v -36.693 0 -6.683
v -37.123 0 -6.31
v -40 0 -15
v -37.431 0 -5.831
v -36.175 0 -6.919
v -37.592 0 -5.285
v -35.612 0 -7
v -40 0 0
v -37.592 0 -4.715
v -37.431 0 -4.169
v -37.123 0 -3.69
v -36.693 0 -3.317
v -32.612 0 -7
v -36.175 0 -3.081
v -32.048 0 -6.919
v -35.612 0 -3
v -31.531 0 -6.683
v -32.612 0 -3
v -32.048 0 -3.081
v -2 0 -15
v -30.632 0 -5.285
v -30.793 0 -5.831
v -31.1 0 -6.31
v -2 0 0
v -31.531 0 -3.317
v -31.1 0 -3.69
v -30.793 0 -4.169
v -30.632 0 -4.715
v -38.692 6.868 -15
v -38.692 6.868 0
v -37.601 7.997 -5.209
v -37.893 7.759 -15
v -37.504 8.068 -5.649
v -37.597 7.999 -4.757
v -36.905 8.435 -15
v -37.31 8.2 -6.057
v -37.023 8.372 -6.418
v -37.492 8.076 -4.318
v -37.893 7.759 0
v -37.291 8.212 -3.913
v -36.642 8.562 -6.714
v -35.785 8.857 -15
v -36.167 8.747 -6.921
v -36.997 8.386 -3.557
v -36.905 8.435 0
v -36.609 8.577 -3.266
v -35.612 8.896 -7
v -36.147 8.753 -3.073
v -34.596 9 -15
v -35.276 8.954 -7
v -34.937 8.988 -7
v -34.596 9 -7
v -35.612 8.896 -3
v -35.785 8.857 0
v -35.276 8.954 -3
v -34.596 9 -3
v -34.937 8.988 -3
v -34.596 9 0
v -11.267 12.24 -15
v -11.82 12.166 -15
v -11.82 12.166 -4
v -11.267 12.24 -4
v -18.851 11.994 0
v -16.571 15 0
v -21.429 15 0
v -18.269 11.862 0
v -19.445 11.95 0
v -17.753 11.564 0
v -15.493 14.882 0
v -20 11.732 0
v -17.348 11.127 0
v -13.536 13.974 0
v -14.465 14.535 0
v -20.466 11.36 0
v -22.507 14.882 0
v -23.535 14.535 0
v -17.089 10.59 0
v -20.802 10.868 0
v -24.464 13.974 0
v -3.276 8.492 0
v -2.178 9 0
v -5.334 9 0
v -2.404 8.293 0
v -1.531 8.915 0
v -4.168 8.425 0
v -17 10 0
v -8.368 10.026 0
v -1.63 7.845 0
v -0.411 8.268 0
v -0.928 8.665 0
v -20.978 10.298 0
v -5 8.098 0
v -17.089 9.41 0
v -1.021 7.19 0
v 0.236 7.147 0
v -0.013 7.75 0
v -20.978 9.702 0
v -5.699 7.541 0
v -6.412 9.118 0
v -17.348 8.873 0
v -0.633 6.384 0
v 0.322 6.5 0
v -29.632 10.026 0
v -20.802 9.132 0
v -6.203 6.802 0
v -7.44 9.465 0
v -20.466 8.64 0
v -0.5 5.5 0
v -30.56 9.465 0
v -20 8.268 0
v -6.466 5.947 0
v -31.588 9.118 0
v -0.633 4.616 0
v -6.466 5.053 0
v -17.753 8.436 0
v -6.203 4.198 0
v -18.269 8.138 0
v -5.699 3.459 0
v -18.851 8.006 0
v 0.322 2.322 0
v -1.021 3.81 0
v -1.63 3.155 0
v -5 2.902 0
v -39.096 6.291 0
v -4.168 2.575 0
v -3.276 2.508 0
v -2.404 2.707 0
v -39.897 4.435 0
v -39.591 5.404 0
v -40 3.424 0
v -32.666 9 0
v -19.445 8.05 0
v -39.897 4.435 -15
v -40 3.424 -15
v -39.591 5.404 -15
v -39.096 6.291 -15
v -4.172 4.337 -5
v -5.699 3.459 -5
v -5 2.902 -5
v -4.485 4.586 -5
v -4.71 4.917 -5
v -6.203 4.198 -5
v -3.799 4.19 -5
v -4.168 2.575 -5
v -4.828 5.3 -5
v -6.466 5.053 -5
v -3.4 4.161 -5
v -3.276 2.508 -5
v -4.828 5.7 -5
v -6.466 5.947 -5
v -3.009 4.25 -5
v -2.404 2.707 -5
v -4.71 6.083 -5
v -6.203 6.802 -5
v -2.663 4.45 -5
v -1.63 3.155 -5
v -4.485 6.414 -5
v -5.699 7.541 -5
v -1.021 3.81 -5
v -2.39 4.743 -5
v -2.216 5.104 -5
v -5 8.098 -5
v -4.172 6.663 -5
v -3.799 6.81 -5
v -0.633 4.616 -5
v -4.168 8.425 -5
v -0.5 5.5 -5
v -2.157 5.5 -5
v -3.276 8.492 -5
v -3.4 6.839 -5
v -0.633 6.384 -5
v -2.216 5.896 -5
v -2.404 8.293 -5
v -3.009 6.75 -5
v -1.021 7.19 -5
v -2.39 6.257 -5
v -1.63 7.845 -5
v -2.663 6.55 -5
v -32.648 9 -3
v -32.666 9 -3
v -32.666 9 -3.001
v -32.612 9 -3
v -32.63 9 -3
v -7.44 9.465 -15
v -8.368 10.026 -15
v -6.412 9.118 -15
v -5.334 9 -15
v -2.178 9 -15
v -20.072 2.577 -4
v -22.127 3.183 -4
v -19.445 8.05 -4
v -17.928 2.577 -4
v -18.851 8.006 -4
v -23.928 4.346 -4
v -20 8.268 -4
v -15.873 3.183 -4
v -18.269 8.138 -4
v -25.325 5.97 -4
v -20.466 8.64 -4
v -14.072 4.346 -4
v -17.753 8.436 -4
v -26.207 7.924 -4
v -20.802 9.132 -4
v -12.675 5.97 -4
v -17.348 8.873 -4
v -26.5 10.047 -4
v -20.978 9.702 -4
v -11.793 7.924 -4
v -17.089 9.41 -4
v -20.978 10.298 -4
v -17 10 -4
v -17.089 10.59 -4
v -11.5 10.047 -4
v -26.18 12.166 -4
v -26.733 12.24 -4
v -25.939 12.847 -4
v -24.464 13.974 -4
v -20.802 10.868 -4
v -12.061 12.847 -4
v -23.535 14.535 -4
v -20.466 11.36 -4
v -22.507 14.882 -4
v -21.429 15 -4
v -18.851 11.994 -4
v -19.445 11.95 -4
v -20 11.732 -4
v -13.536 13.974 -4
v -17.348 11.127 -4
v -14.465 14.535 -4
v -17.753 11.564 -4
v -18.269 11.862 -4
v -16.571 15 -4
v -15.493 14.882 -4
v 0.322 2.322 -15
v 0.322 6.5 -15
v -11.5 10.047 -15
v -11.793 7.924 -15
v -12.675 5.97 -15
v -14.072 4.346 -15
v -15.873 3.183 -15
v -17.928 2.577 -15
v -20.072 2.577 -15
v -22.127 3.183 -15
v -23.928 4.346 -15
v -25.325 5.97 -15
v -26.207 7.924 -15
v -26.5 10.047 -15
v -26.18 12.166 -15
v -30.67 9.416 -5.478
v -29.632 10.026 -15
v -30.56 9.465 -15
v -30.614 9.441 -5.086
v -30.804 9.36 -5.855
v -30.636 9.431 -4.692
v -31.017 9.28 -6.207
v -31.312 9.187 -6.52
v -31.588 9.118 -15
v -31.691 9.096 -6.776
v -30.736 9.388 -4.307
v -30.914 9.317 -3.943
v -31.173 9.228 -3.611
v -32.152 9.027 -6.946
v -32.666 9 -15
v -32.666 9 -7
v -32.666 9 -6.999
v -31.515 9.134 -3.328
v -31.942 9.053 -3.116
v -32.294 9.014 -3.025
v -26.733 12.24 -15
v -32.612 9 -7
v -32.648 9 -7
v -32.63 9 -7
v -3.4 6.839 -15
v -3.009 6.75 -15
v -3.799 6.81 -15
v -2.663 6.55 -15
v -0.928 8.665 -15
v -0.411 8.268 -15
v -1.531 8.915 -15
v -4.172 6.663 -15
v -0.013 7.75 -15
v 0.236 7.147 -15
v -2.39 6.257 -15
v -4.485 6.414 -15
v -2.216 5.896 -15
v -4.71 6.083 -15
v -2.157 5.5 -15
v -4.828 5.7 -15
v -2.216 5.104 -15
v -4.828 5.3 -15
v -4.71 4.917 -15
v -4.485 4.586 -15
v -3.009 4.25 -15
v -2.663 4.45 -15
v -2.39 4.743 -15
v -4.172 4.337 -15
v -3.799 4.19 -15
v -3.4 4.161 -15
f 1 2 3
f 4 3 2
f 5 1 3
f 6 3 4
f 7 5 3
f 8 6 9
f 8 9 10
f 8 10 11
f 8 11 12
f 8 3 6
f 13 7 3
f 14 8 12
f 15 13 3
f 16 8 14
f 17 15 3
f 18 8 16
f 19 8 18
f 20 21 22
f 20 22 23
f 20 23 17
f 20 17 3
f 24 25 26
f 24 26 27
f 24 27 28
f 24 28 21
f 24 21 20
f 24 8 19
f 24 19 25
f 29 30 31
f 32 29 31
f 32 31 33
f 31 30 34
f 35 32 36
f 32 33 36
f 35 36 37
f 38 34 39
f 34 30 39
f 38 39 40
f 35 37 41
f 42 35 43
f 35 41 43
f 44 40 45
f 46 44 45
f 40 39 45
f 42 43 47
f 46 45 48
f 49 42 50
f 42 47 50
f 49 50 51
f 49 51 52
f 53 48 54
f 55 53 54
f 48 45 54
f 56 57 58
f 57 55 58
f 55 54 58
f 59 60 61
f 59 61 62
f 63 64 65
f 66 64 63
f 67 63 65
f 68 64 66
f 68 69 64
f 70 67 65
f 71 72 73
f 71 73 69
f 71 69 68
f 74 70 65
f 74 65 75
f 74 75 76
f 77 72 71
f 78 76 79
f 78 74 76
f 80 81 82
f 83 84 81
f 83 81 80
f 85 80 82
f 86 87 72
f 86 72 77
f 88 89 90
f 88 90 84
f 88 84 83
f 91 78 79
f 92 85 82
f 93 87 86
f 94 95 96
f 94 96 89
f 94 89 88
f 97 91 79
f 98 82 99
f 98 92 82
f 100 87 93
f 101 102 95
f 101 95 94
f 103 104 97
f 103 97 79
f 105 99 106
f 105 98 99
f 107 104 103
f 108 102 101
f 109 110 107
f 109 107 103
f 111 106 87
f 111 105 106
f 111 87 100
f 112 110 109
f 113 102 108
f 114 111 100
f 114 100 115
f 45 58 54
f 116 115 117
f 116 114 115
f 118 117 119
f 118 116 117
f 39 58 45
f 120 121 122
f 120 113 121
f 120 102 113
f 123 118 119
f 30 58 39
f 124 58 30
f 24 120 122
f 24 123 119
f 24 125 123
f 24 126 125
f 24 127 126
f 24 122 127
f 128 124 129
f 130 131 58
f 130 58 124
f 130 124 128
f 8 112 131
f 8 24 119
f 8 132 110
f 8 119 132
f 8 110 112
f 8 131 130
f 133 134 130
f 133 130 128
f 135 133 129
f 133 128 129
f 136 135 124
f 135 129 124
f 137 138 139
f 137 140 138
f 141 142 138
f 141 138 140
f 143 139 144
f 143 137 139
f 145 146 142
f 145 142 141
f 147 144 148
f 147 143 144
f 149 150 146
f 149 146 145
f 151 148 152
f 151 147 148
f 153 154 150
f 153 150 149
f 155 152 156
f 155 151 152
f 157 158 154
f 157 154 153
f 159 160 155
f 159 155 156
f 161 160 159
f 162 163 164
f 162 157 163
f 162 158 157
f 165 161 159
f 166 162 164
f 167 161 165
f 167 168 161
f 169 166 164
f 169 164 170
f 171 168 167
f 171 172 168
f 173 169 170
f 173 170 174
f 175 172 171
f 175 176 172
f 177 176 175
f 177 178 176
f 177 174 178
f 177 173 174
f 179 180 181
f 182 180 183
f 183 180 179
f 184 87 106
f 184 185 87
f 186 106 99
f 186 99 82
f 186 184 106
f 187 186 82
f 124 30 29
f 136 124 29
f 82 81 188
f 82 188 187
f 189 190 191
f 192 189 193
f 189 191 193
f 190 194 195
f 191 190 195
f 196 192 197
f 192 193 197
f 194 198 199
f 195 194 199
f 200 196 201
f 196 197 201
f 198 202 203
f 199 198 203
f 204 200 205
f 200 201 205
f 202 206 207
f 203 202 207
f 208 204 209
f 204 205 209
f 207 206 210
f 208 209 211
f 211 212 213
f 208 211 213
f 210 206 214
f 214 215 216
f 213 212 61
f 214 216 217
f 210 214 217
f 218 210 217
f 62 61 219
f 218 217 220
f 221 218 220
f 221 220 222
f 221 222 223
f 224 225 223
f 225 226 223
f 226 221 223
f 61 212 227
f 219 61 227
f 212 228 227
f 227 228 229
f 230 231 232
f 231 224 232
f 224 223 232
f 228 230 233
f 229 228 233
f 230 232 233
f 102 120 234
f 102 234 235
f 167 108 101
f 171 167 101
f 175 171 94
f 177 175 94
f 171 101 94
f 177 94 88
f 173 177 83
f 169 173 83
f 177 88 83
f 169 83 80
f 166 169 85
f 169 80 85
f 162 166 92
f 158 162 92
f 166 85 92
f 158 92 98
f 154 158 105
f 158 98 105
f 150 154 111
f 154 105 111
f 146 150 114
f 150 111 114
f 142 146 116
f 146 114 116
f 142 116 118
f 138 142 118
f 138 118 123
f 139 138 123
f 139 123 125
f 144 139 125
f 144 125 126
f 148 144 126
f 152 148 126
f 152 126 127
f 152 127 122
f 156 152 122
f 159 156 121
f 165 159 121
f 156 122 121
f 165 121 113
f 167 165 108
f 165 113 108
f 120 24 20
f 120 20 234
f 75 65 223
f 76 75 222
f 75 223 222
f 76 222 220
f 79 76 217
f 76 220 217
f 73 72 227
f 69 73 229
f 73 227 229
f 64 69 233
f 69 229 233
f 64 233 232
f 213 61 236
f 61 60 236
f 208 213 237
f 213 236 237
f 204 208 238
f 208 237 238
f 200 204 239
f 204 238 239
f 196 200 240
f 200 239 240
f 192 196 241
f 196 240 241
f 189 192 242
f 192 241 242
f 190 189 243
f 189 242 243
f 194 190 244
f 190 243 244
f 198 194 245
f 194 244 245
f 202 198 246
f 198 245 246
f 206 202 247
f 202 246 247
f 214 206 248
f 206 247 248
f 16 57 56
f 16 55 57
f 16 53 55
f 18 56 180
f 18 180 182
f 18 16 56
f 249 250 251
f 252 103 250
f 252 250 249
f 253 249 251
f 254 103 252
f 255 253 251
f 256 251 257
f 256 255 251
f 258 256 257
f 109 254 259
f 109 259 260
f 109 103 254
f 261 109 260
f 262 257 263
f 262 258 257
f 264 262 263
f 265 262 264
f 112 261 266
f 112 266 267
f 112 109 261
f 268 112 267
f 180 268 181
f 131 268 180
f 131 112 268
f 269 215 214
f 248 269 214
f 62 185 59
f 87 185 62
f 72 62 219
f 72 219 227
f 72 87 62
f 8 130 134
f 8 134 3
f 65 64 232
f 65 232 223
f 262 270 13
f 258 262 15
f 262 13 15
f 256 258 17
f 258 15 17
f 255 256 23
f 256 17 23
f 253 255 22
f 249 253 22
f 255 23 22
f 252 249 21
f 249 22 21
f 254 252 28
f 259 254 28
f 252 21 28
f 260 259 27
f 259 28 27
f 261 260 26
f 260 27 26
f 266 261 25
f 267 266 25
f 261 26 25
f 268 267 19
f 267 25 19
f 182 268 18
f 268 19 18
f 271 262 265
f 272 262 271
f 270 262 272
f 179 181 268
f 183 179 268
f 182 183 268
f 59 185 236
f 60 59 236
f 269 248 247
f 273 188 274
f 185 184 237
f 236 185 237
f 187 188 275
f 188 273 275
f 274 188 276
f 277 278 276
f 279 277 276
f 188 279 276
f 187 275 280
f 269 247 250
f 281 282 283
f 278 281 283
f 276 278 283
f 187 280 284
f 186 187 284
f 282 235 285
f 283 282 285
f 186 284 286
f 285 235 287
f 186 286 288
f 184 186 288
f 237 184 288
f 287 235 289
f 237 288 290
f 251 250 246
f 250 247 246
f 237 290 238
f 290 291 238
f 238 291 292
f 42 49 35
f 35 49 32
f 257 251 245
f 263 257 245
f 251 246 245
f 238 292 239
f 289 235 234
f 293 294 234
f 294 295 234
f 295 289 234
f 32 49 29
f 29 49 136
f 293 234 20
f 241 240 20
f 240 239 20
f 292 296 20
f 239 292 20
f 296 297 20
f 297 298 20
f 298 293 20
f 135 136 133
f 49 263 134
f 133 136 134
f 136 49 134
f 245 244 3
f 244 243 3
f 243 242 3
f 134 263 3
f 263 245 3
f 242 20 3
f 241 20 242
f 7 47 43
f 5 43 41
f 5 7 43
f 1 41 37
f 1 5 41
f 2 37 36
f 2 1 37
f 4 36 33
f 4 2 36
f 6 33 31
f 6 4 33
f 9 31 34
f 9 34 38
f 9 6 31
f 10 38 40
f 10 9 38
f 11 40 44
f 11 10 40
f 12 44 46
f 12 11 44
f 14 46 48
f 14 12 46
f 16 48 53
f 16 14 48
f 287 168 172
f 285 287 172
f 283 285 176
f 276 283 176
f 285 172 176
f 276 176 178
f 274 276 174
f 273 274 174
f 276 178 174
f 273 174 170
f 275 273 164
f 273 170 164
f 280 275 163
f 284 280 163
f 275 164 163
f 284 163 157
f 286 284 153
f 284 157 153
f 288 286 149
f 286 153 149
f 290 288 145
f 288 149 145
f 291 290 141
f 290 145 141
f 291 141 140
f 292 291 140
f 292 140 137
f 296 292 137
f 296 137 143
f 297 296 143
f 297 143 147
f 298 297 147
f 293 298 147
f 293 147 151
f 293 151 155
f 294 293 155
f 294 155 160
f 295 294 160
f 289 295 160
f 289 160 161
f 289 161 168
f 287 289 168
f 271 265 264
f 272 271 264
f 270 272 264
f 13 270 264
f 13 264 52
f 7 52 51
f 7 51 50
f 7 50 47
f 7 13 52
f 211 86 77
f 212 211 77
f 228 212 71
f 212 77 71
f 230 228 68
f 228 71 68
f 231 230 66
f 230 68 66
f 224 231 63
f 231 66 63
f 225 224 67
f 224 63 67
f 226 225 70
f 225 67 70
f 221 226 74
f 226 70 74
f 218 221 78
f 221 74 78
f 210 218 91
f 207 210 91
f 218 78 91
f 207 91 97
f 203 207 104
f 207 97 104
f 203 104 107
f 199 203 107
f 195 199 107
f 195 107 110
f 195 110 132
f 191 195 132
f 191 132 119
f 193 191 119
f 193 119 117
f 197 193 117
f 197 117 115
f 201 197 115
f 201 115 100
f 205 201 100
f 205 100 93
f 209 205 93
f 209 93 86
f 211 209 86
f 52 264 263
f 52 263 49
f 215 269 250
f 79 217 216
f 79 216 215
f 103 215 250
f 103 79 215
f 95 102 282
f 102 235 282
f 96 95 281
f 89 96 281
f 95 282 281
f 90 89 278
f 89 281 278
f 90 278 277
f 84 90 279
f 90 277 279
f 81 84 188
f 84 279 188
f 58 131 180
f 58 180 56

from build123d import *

# Parameters (mm, degrees)
SCHIZZO2_R                   = 2
SCHIZZO2_R_2                 = 1.343240654
ESTRUSIONE_ESTRUSIONE1_DEPTH = 15
SCHIZZO3_R                   = 7.5
TAGLIO_ESTRUSIONE1_DEPTH     = 11
SMUSSO3_SIZE                 = 1
RACCORDO1_R                  = 2.5
SMUSSO4_SIZE                 = 4
SMUSSO4_SIZE2                = 2.800830153
TAGLIO_ESTRUSIONE3_DEPTH     = 46.276925691
FILLET1_R                    = 5
FILLET3_R                    = 5
FILLET4_R                    = 5
FILLET5_R                    = 5
SKETCH1_R                    = 3
CUT_EXTRUDE1_DEPTH           = 5


with BuildPart() as part:
    # Schizzo2 → Estrusione-Estrusione1 (new body)
    with BuildSketch(Plane.XY):
        Polygon((-40, 0), (-2, 0), (0.321661039, 2.321661039), (0.321661039, 9), (-7.024563842, 9), (-14.880083854, 15), (-23.119916146, 15), (-30.975436158, 9), (-40, 9), align=None)
        with Locations((-19, 10)):
            Circle(SCHIZZO2_R, mode=Mode.SUBTRACT)
        with Locations((-3.5, 5.5)):
            Circle(SCHIZZO2_R_2, mode=Mode.SUBTRACT)
    extrude(amount=-ESTRUSIONE_ESTRUSIONE1_DEPTH)

    # Schizzo3 → Taglio-Estrusione1 (cut)
    with BuildSketch(Plane(origin=(0, 0, -15), x_dir=(-1, 0, 0), z_dir=(0, 0, -1))):
        with Locations((19, 10)):
            Circle(SCHIZZO3_R)
    extrude(amount=-TAGLIO_ESTRUSIONE1_DEPTH, mode=Mode.SUBTRACT)

    # Smusso3
    # the kernel refuses this chamfer: 1, 0.730975935 mm, written as the material it takes off along each edge
    with BuildSketch(Plane(origin=(-25.938580935, 12.847120406, -4), x_dir=(-0.7947073367402627, -0.6069927914985472, 0), z_dir=(0, 0, -1))) as smusso3_piece_1:
        with BuildLine():
            Line((SMUSSO3_SIZE, 0), (0.605555486, -0.394444514))
            ThreePointArc((0.605555486, -0.394444514), (0.30405624, -0.187661825), (0, 0))
            Line((0, 0), (SMUSSO3_SIZE, 0))
        make_face()
    extrude(amount=13.571682988, mode=Mode.SUBTRACT)
    with BuildSketch(Plane(origin=(-12.061419065, 12.847120406, -4), x_dir=(0.33460224521765425, -0.94235945238285, 0), z_dir=(0, 0, -1))) as smusso3_piece_2:
        with BuildLine():
            Line((0.722692134, 0), (SMUSSO3_SIZE * 0.837916253761, -SMUSSO3_SIZE * 0.545798819789))
            Line((SMUSSO3_SIZE * 0.837916253761, -SMUSSO3_SIZE * 0.545798819789), (0, 0))
            ThreePointArc((0, 0), (0.357199268, -0.008708643), (0.722692134, 0))
        make_face()
    extrude(amount=13.571682988, mode=Mode.SUBTRACT)

    # Raccordo1
    raccordo1_edges = [part.edges().sort_by_distance(p)[0] for p in [
        (0.321661039, 9, -7.5),
    ]]
    fillet(raccordo1_edges, radius=RACCORDO1_R)

    # Smusso4
    smusso4_edges = [part.edges().sort_by_distance(p)[0] for p in [
        (-40, 9, -7.5),
    ]]
    smusso4_side = [part.faces().sort_by_distance(p)[0] for p in [
        (-40, 4.5, -7.5),
    ]]
    chamfer(smusso4_edges, length=SMUSSO4_SIZE, length2=SMUSSO4_SIZE2, reference=smusso4_side[0])

    # Schizzo5 → Taglio-Estrusione3 (cut, through all)
    with BuildSketch(Plane.XZ):
        with BuildLine():
            Line((-35.611900304, -3), (-32.611900304, -3))
            ThreePointArc((-32.611900304, -3), (-30.611900304, -5), (-32.611900304, -7))
            Line((-32.611900304, -7), (-35.611900304, -7))
            ThreePointArc((-35.611900304, -7), (-37.611900304, -5), (-35.611900304, -3))
        make_face()
    extrude(amount=-TAGLIO_ESTRUSIONE3_DEPTH, mode=Mode.SUBTRACT)

    # Fillet1
    fillet1_edges = [part.edges().sort_by_distance(p)[0] for p in [
        (-7.024563842, 9, -7.5),
    ]]
    fillet(fillet1_edges, radius=FILLET1_R)

    # Fillet3
    # the kernel refuses this fillet: 5 mm, written as the material it takes off along each edge
    with BuildSketch(Plane(origin=(-37.199169847, 9, 0.290299162), x_dir=(-0.573576436351049, -0.8191520442889898, 0), z_dir=(0, 0, -1))) as fillet3_piece_1:
        with BuildLine():
            CenterArc((FILLET3_R * 0.520567050552, -FILLET3_R), FILLET3_R, 90, 55)
            Line((-FILLET3_R * 0.298584993737, -FILLET3_R * 0.426423563649), (0, 0))
            Line((0, 0), (FILLET3_R * 0.520567050552, 0))
        make_face()
    extrude(amount=21.797387294, mode=Mode.SUBTRACT)
    with BuildSketch(Plane(origin=(-40, 5, 3.941234861), x_dir=(0, -1, 0), z_dir=(0, 0, -1))) as fillet3_piece_2:
        with BuildLine():
            CenterArc((FILLET3_R * 0.315298788879, -FILLET3_R), FILLET3_R, 90, 35)
            Line((-FILLET3_R * 0.258277647472, -FILLET3_R * 0.180847955711), (0, 0))
            Line((0, 0), (FILLET3_R * 0.315298788879, 0))
        make_face()
    extrude(amount=22.882469722, mode=Mode.SUBTRACT)
    with BuildSketch(Plane(origin=(-37.199169847, 9, 6.507088132), x_dir=(-0.573576436351049, -0.8191520442889898, 0), z_dir=(0, 0, -1))) as fillet3_piece_3:
        with BuildLine():
            CenterArc((FILLET3_R * 0.520567050552, -FILLET3_R), FILLET3_R, 90, 55)
            Line((-FILLET3_R * 0.298584993737, -FILLET3_R * 0.426423563649), (0, 0))
            Line((0, 0), (FILLET3_R * 0.520567050552, 0))
        make_face()
    extrude(amount=16.797387294, mode=Mode.SUBTRACT)

    # Fillet4
    fillet4_edges = [part.edges().sort_by_distance(p)[0] for p in [
        (-14.880083854, 15, -2),
        (-23.119916146, 15, -2),
    ]]
    fillet(fillet4_edges, radius=FILLET4_R)

    # Fillet5
    # the kernel refuses this fillet: 5 mm, written as the material it adds along each edge
    with BuildSketch(Plane(origin=(-30.975436158, 9, -1.922117515), x_dir=(0.794707336740263, 0.6069927914985467, 0), z_dir=(0, 0, -1))) as fillet5_piece_1_section:
        with BuildLine():
            CenterArc((FILLET5_R * 0.338212687424, -FILLET5_R), FILLET5_R, 90, 37.372378399)
            Line((-FILLET5_R * 0.268780104075, -FILLET5_R * 0.20529266326), (0, 0))
            Line((0, 0), (FILLET5_R * 0.338212687424, 0))
        make_face()
    fillet5_piece_1 = extrude(amount=13.077882485, mode=Mode.PRIVATE)
    fillet5_piece_1 = fillet5_piece_1 - Plane(origin=(-32.611900304, 9, -5), x_dir=(0, 0, 1), z_dir=(0, -1, 0)) * Cylinder(2, 33, mode=Mode.PRIVATE)
    add(fillet5_piece_1)
    with BuildSketch(Plane(origin=(-30.975436158, 9, 0), x_dir=(0.794707336740263, 0.6069927914985467, 0), z_dir=(0, 0, -1))) as fillet5_piece_2_section:
        with BuildLine():
            CenterArc((FILLET5_R * 0.338212687424, -FILLET5_R), FILLET5_R, 90, 37.372378399)
            Line((-FILLET5_R * 0.268780104075, -FILLET5_R * 0.20529266326), (0, 0))
            Line((0, 0), (FILLET5_R * 0.338212687424, 0))
        make_face()
    fillet5_piece_2 = extrude(amount=8.077882485, mode=Mode.PRIVATE)
    fillet5_piece_2 = fillet5_piece_2 - Plane(origin=(-32.611900304, 9, -5), x_dir=(0, 0, 1), z_dir=(0, -1, 0)) * Cylinder(2, 23, mode=Mode.PRIVATE)
    add(fillet5_piece_2)

    # Sketch1 → Cut-Extrude1 (cut)
    with BuildSketch(Plane.XY):
        with Locations((-3.5, 5.5)):
            Circle(SKETCH1_R)
    extrude(amount=-CUT_EXTRUDE1_DEPTH, mode=Mode.SUBTRACT)


solid = part.part
